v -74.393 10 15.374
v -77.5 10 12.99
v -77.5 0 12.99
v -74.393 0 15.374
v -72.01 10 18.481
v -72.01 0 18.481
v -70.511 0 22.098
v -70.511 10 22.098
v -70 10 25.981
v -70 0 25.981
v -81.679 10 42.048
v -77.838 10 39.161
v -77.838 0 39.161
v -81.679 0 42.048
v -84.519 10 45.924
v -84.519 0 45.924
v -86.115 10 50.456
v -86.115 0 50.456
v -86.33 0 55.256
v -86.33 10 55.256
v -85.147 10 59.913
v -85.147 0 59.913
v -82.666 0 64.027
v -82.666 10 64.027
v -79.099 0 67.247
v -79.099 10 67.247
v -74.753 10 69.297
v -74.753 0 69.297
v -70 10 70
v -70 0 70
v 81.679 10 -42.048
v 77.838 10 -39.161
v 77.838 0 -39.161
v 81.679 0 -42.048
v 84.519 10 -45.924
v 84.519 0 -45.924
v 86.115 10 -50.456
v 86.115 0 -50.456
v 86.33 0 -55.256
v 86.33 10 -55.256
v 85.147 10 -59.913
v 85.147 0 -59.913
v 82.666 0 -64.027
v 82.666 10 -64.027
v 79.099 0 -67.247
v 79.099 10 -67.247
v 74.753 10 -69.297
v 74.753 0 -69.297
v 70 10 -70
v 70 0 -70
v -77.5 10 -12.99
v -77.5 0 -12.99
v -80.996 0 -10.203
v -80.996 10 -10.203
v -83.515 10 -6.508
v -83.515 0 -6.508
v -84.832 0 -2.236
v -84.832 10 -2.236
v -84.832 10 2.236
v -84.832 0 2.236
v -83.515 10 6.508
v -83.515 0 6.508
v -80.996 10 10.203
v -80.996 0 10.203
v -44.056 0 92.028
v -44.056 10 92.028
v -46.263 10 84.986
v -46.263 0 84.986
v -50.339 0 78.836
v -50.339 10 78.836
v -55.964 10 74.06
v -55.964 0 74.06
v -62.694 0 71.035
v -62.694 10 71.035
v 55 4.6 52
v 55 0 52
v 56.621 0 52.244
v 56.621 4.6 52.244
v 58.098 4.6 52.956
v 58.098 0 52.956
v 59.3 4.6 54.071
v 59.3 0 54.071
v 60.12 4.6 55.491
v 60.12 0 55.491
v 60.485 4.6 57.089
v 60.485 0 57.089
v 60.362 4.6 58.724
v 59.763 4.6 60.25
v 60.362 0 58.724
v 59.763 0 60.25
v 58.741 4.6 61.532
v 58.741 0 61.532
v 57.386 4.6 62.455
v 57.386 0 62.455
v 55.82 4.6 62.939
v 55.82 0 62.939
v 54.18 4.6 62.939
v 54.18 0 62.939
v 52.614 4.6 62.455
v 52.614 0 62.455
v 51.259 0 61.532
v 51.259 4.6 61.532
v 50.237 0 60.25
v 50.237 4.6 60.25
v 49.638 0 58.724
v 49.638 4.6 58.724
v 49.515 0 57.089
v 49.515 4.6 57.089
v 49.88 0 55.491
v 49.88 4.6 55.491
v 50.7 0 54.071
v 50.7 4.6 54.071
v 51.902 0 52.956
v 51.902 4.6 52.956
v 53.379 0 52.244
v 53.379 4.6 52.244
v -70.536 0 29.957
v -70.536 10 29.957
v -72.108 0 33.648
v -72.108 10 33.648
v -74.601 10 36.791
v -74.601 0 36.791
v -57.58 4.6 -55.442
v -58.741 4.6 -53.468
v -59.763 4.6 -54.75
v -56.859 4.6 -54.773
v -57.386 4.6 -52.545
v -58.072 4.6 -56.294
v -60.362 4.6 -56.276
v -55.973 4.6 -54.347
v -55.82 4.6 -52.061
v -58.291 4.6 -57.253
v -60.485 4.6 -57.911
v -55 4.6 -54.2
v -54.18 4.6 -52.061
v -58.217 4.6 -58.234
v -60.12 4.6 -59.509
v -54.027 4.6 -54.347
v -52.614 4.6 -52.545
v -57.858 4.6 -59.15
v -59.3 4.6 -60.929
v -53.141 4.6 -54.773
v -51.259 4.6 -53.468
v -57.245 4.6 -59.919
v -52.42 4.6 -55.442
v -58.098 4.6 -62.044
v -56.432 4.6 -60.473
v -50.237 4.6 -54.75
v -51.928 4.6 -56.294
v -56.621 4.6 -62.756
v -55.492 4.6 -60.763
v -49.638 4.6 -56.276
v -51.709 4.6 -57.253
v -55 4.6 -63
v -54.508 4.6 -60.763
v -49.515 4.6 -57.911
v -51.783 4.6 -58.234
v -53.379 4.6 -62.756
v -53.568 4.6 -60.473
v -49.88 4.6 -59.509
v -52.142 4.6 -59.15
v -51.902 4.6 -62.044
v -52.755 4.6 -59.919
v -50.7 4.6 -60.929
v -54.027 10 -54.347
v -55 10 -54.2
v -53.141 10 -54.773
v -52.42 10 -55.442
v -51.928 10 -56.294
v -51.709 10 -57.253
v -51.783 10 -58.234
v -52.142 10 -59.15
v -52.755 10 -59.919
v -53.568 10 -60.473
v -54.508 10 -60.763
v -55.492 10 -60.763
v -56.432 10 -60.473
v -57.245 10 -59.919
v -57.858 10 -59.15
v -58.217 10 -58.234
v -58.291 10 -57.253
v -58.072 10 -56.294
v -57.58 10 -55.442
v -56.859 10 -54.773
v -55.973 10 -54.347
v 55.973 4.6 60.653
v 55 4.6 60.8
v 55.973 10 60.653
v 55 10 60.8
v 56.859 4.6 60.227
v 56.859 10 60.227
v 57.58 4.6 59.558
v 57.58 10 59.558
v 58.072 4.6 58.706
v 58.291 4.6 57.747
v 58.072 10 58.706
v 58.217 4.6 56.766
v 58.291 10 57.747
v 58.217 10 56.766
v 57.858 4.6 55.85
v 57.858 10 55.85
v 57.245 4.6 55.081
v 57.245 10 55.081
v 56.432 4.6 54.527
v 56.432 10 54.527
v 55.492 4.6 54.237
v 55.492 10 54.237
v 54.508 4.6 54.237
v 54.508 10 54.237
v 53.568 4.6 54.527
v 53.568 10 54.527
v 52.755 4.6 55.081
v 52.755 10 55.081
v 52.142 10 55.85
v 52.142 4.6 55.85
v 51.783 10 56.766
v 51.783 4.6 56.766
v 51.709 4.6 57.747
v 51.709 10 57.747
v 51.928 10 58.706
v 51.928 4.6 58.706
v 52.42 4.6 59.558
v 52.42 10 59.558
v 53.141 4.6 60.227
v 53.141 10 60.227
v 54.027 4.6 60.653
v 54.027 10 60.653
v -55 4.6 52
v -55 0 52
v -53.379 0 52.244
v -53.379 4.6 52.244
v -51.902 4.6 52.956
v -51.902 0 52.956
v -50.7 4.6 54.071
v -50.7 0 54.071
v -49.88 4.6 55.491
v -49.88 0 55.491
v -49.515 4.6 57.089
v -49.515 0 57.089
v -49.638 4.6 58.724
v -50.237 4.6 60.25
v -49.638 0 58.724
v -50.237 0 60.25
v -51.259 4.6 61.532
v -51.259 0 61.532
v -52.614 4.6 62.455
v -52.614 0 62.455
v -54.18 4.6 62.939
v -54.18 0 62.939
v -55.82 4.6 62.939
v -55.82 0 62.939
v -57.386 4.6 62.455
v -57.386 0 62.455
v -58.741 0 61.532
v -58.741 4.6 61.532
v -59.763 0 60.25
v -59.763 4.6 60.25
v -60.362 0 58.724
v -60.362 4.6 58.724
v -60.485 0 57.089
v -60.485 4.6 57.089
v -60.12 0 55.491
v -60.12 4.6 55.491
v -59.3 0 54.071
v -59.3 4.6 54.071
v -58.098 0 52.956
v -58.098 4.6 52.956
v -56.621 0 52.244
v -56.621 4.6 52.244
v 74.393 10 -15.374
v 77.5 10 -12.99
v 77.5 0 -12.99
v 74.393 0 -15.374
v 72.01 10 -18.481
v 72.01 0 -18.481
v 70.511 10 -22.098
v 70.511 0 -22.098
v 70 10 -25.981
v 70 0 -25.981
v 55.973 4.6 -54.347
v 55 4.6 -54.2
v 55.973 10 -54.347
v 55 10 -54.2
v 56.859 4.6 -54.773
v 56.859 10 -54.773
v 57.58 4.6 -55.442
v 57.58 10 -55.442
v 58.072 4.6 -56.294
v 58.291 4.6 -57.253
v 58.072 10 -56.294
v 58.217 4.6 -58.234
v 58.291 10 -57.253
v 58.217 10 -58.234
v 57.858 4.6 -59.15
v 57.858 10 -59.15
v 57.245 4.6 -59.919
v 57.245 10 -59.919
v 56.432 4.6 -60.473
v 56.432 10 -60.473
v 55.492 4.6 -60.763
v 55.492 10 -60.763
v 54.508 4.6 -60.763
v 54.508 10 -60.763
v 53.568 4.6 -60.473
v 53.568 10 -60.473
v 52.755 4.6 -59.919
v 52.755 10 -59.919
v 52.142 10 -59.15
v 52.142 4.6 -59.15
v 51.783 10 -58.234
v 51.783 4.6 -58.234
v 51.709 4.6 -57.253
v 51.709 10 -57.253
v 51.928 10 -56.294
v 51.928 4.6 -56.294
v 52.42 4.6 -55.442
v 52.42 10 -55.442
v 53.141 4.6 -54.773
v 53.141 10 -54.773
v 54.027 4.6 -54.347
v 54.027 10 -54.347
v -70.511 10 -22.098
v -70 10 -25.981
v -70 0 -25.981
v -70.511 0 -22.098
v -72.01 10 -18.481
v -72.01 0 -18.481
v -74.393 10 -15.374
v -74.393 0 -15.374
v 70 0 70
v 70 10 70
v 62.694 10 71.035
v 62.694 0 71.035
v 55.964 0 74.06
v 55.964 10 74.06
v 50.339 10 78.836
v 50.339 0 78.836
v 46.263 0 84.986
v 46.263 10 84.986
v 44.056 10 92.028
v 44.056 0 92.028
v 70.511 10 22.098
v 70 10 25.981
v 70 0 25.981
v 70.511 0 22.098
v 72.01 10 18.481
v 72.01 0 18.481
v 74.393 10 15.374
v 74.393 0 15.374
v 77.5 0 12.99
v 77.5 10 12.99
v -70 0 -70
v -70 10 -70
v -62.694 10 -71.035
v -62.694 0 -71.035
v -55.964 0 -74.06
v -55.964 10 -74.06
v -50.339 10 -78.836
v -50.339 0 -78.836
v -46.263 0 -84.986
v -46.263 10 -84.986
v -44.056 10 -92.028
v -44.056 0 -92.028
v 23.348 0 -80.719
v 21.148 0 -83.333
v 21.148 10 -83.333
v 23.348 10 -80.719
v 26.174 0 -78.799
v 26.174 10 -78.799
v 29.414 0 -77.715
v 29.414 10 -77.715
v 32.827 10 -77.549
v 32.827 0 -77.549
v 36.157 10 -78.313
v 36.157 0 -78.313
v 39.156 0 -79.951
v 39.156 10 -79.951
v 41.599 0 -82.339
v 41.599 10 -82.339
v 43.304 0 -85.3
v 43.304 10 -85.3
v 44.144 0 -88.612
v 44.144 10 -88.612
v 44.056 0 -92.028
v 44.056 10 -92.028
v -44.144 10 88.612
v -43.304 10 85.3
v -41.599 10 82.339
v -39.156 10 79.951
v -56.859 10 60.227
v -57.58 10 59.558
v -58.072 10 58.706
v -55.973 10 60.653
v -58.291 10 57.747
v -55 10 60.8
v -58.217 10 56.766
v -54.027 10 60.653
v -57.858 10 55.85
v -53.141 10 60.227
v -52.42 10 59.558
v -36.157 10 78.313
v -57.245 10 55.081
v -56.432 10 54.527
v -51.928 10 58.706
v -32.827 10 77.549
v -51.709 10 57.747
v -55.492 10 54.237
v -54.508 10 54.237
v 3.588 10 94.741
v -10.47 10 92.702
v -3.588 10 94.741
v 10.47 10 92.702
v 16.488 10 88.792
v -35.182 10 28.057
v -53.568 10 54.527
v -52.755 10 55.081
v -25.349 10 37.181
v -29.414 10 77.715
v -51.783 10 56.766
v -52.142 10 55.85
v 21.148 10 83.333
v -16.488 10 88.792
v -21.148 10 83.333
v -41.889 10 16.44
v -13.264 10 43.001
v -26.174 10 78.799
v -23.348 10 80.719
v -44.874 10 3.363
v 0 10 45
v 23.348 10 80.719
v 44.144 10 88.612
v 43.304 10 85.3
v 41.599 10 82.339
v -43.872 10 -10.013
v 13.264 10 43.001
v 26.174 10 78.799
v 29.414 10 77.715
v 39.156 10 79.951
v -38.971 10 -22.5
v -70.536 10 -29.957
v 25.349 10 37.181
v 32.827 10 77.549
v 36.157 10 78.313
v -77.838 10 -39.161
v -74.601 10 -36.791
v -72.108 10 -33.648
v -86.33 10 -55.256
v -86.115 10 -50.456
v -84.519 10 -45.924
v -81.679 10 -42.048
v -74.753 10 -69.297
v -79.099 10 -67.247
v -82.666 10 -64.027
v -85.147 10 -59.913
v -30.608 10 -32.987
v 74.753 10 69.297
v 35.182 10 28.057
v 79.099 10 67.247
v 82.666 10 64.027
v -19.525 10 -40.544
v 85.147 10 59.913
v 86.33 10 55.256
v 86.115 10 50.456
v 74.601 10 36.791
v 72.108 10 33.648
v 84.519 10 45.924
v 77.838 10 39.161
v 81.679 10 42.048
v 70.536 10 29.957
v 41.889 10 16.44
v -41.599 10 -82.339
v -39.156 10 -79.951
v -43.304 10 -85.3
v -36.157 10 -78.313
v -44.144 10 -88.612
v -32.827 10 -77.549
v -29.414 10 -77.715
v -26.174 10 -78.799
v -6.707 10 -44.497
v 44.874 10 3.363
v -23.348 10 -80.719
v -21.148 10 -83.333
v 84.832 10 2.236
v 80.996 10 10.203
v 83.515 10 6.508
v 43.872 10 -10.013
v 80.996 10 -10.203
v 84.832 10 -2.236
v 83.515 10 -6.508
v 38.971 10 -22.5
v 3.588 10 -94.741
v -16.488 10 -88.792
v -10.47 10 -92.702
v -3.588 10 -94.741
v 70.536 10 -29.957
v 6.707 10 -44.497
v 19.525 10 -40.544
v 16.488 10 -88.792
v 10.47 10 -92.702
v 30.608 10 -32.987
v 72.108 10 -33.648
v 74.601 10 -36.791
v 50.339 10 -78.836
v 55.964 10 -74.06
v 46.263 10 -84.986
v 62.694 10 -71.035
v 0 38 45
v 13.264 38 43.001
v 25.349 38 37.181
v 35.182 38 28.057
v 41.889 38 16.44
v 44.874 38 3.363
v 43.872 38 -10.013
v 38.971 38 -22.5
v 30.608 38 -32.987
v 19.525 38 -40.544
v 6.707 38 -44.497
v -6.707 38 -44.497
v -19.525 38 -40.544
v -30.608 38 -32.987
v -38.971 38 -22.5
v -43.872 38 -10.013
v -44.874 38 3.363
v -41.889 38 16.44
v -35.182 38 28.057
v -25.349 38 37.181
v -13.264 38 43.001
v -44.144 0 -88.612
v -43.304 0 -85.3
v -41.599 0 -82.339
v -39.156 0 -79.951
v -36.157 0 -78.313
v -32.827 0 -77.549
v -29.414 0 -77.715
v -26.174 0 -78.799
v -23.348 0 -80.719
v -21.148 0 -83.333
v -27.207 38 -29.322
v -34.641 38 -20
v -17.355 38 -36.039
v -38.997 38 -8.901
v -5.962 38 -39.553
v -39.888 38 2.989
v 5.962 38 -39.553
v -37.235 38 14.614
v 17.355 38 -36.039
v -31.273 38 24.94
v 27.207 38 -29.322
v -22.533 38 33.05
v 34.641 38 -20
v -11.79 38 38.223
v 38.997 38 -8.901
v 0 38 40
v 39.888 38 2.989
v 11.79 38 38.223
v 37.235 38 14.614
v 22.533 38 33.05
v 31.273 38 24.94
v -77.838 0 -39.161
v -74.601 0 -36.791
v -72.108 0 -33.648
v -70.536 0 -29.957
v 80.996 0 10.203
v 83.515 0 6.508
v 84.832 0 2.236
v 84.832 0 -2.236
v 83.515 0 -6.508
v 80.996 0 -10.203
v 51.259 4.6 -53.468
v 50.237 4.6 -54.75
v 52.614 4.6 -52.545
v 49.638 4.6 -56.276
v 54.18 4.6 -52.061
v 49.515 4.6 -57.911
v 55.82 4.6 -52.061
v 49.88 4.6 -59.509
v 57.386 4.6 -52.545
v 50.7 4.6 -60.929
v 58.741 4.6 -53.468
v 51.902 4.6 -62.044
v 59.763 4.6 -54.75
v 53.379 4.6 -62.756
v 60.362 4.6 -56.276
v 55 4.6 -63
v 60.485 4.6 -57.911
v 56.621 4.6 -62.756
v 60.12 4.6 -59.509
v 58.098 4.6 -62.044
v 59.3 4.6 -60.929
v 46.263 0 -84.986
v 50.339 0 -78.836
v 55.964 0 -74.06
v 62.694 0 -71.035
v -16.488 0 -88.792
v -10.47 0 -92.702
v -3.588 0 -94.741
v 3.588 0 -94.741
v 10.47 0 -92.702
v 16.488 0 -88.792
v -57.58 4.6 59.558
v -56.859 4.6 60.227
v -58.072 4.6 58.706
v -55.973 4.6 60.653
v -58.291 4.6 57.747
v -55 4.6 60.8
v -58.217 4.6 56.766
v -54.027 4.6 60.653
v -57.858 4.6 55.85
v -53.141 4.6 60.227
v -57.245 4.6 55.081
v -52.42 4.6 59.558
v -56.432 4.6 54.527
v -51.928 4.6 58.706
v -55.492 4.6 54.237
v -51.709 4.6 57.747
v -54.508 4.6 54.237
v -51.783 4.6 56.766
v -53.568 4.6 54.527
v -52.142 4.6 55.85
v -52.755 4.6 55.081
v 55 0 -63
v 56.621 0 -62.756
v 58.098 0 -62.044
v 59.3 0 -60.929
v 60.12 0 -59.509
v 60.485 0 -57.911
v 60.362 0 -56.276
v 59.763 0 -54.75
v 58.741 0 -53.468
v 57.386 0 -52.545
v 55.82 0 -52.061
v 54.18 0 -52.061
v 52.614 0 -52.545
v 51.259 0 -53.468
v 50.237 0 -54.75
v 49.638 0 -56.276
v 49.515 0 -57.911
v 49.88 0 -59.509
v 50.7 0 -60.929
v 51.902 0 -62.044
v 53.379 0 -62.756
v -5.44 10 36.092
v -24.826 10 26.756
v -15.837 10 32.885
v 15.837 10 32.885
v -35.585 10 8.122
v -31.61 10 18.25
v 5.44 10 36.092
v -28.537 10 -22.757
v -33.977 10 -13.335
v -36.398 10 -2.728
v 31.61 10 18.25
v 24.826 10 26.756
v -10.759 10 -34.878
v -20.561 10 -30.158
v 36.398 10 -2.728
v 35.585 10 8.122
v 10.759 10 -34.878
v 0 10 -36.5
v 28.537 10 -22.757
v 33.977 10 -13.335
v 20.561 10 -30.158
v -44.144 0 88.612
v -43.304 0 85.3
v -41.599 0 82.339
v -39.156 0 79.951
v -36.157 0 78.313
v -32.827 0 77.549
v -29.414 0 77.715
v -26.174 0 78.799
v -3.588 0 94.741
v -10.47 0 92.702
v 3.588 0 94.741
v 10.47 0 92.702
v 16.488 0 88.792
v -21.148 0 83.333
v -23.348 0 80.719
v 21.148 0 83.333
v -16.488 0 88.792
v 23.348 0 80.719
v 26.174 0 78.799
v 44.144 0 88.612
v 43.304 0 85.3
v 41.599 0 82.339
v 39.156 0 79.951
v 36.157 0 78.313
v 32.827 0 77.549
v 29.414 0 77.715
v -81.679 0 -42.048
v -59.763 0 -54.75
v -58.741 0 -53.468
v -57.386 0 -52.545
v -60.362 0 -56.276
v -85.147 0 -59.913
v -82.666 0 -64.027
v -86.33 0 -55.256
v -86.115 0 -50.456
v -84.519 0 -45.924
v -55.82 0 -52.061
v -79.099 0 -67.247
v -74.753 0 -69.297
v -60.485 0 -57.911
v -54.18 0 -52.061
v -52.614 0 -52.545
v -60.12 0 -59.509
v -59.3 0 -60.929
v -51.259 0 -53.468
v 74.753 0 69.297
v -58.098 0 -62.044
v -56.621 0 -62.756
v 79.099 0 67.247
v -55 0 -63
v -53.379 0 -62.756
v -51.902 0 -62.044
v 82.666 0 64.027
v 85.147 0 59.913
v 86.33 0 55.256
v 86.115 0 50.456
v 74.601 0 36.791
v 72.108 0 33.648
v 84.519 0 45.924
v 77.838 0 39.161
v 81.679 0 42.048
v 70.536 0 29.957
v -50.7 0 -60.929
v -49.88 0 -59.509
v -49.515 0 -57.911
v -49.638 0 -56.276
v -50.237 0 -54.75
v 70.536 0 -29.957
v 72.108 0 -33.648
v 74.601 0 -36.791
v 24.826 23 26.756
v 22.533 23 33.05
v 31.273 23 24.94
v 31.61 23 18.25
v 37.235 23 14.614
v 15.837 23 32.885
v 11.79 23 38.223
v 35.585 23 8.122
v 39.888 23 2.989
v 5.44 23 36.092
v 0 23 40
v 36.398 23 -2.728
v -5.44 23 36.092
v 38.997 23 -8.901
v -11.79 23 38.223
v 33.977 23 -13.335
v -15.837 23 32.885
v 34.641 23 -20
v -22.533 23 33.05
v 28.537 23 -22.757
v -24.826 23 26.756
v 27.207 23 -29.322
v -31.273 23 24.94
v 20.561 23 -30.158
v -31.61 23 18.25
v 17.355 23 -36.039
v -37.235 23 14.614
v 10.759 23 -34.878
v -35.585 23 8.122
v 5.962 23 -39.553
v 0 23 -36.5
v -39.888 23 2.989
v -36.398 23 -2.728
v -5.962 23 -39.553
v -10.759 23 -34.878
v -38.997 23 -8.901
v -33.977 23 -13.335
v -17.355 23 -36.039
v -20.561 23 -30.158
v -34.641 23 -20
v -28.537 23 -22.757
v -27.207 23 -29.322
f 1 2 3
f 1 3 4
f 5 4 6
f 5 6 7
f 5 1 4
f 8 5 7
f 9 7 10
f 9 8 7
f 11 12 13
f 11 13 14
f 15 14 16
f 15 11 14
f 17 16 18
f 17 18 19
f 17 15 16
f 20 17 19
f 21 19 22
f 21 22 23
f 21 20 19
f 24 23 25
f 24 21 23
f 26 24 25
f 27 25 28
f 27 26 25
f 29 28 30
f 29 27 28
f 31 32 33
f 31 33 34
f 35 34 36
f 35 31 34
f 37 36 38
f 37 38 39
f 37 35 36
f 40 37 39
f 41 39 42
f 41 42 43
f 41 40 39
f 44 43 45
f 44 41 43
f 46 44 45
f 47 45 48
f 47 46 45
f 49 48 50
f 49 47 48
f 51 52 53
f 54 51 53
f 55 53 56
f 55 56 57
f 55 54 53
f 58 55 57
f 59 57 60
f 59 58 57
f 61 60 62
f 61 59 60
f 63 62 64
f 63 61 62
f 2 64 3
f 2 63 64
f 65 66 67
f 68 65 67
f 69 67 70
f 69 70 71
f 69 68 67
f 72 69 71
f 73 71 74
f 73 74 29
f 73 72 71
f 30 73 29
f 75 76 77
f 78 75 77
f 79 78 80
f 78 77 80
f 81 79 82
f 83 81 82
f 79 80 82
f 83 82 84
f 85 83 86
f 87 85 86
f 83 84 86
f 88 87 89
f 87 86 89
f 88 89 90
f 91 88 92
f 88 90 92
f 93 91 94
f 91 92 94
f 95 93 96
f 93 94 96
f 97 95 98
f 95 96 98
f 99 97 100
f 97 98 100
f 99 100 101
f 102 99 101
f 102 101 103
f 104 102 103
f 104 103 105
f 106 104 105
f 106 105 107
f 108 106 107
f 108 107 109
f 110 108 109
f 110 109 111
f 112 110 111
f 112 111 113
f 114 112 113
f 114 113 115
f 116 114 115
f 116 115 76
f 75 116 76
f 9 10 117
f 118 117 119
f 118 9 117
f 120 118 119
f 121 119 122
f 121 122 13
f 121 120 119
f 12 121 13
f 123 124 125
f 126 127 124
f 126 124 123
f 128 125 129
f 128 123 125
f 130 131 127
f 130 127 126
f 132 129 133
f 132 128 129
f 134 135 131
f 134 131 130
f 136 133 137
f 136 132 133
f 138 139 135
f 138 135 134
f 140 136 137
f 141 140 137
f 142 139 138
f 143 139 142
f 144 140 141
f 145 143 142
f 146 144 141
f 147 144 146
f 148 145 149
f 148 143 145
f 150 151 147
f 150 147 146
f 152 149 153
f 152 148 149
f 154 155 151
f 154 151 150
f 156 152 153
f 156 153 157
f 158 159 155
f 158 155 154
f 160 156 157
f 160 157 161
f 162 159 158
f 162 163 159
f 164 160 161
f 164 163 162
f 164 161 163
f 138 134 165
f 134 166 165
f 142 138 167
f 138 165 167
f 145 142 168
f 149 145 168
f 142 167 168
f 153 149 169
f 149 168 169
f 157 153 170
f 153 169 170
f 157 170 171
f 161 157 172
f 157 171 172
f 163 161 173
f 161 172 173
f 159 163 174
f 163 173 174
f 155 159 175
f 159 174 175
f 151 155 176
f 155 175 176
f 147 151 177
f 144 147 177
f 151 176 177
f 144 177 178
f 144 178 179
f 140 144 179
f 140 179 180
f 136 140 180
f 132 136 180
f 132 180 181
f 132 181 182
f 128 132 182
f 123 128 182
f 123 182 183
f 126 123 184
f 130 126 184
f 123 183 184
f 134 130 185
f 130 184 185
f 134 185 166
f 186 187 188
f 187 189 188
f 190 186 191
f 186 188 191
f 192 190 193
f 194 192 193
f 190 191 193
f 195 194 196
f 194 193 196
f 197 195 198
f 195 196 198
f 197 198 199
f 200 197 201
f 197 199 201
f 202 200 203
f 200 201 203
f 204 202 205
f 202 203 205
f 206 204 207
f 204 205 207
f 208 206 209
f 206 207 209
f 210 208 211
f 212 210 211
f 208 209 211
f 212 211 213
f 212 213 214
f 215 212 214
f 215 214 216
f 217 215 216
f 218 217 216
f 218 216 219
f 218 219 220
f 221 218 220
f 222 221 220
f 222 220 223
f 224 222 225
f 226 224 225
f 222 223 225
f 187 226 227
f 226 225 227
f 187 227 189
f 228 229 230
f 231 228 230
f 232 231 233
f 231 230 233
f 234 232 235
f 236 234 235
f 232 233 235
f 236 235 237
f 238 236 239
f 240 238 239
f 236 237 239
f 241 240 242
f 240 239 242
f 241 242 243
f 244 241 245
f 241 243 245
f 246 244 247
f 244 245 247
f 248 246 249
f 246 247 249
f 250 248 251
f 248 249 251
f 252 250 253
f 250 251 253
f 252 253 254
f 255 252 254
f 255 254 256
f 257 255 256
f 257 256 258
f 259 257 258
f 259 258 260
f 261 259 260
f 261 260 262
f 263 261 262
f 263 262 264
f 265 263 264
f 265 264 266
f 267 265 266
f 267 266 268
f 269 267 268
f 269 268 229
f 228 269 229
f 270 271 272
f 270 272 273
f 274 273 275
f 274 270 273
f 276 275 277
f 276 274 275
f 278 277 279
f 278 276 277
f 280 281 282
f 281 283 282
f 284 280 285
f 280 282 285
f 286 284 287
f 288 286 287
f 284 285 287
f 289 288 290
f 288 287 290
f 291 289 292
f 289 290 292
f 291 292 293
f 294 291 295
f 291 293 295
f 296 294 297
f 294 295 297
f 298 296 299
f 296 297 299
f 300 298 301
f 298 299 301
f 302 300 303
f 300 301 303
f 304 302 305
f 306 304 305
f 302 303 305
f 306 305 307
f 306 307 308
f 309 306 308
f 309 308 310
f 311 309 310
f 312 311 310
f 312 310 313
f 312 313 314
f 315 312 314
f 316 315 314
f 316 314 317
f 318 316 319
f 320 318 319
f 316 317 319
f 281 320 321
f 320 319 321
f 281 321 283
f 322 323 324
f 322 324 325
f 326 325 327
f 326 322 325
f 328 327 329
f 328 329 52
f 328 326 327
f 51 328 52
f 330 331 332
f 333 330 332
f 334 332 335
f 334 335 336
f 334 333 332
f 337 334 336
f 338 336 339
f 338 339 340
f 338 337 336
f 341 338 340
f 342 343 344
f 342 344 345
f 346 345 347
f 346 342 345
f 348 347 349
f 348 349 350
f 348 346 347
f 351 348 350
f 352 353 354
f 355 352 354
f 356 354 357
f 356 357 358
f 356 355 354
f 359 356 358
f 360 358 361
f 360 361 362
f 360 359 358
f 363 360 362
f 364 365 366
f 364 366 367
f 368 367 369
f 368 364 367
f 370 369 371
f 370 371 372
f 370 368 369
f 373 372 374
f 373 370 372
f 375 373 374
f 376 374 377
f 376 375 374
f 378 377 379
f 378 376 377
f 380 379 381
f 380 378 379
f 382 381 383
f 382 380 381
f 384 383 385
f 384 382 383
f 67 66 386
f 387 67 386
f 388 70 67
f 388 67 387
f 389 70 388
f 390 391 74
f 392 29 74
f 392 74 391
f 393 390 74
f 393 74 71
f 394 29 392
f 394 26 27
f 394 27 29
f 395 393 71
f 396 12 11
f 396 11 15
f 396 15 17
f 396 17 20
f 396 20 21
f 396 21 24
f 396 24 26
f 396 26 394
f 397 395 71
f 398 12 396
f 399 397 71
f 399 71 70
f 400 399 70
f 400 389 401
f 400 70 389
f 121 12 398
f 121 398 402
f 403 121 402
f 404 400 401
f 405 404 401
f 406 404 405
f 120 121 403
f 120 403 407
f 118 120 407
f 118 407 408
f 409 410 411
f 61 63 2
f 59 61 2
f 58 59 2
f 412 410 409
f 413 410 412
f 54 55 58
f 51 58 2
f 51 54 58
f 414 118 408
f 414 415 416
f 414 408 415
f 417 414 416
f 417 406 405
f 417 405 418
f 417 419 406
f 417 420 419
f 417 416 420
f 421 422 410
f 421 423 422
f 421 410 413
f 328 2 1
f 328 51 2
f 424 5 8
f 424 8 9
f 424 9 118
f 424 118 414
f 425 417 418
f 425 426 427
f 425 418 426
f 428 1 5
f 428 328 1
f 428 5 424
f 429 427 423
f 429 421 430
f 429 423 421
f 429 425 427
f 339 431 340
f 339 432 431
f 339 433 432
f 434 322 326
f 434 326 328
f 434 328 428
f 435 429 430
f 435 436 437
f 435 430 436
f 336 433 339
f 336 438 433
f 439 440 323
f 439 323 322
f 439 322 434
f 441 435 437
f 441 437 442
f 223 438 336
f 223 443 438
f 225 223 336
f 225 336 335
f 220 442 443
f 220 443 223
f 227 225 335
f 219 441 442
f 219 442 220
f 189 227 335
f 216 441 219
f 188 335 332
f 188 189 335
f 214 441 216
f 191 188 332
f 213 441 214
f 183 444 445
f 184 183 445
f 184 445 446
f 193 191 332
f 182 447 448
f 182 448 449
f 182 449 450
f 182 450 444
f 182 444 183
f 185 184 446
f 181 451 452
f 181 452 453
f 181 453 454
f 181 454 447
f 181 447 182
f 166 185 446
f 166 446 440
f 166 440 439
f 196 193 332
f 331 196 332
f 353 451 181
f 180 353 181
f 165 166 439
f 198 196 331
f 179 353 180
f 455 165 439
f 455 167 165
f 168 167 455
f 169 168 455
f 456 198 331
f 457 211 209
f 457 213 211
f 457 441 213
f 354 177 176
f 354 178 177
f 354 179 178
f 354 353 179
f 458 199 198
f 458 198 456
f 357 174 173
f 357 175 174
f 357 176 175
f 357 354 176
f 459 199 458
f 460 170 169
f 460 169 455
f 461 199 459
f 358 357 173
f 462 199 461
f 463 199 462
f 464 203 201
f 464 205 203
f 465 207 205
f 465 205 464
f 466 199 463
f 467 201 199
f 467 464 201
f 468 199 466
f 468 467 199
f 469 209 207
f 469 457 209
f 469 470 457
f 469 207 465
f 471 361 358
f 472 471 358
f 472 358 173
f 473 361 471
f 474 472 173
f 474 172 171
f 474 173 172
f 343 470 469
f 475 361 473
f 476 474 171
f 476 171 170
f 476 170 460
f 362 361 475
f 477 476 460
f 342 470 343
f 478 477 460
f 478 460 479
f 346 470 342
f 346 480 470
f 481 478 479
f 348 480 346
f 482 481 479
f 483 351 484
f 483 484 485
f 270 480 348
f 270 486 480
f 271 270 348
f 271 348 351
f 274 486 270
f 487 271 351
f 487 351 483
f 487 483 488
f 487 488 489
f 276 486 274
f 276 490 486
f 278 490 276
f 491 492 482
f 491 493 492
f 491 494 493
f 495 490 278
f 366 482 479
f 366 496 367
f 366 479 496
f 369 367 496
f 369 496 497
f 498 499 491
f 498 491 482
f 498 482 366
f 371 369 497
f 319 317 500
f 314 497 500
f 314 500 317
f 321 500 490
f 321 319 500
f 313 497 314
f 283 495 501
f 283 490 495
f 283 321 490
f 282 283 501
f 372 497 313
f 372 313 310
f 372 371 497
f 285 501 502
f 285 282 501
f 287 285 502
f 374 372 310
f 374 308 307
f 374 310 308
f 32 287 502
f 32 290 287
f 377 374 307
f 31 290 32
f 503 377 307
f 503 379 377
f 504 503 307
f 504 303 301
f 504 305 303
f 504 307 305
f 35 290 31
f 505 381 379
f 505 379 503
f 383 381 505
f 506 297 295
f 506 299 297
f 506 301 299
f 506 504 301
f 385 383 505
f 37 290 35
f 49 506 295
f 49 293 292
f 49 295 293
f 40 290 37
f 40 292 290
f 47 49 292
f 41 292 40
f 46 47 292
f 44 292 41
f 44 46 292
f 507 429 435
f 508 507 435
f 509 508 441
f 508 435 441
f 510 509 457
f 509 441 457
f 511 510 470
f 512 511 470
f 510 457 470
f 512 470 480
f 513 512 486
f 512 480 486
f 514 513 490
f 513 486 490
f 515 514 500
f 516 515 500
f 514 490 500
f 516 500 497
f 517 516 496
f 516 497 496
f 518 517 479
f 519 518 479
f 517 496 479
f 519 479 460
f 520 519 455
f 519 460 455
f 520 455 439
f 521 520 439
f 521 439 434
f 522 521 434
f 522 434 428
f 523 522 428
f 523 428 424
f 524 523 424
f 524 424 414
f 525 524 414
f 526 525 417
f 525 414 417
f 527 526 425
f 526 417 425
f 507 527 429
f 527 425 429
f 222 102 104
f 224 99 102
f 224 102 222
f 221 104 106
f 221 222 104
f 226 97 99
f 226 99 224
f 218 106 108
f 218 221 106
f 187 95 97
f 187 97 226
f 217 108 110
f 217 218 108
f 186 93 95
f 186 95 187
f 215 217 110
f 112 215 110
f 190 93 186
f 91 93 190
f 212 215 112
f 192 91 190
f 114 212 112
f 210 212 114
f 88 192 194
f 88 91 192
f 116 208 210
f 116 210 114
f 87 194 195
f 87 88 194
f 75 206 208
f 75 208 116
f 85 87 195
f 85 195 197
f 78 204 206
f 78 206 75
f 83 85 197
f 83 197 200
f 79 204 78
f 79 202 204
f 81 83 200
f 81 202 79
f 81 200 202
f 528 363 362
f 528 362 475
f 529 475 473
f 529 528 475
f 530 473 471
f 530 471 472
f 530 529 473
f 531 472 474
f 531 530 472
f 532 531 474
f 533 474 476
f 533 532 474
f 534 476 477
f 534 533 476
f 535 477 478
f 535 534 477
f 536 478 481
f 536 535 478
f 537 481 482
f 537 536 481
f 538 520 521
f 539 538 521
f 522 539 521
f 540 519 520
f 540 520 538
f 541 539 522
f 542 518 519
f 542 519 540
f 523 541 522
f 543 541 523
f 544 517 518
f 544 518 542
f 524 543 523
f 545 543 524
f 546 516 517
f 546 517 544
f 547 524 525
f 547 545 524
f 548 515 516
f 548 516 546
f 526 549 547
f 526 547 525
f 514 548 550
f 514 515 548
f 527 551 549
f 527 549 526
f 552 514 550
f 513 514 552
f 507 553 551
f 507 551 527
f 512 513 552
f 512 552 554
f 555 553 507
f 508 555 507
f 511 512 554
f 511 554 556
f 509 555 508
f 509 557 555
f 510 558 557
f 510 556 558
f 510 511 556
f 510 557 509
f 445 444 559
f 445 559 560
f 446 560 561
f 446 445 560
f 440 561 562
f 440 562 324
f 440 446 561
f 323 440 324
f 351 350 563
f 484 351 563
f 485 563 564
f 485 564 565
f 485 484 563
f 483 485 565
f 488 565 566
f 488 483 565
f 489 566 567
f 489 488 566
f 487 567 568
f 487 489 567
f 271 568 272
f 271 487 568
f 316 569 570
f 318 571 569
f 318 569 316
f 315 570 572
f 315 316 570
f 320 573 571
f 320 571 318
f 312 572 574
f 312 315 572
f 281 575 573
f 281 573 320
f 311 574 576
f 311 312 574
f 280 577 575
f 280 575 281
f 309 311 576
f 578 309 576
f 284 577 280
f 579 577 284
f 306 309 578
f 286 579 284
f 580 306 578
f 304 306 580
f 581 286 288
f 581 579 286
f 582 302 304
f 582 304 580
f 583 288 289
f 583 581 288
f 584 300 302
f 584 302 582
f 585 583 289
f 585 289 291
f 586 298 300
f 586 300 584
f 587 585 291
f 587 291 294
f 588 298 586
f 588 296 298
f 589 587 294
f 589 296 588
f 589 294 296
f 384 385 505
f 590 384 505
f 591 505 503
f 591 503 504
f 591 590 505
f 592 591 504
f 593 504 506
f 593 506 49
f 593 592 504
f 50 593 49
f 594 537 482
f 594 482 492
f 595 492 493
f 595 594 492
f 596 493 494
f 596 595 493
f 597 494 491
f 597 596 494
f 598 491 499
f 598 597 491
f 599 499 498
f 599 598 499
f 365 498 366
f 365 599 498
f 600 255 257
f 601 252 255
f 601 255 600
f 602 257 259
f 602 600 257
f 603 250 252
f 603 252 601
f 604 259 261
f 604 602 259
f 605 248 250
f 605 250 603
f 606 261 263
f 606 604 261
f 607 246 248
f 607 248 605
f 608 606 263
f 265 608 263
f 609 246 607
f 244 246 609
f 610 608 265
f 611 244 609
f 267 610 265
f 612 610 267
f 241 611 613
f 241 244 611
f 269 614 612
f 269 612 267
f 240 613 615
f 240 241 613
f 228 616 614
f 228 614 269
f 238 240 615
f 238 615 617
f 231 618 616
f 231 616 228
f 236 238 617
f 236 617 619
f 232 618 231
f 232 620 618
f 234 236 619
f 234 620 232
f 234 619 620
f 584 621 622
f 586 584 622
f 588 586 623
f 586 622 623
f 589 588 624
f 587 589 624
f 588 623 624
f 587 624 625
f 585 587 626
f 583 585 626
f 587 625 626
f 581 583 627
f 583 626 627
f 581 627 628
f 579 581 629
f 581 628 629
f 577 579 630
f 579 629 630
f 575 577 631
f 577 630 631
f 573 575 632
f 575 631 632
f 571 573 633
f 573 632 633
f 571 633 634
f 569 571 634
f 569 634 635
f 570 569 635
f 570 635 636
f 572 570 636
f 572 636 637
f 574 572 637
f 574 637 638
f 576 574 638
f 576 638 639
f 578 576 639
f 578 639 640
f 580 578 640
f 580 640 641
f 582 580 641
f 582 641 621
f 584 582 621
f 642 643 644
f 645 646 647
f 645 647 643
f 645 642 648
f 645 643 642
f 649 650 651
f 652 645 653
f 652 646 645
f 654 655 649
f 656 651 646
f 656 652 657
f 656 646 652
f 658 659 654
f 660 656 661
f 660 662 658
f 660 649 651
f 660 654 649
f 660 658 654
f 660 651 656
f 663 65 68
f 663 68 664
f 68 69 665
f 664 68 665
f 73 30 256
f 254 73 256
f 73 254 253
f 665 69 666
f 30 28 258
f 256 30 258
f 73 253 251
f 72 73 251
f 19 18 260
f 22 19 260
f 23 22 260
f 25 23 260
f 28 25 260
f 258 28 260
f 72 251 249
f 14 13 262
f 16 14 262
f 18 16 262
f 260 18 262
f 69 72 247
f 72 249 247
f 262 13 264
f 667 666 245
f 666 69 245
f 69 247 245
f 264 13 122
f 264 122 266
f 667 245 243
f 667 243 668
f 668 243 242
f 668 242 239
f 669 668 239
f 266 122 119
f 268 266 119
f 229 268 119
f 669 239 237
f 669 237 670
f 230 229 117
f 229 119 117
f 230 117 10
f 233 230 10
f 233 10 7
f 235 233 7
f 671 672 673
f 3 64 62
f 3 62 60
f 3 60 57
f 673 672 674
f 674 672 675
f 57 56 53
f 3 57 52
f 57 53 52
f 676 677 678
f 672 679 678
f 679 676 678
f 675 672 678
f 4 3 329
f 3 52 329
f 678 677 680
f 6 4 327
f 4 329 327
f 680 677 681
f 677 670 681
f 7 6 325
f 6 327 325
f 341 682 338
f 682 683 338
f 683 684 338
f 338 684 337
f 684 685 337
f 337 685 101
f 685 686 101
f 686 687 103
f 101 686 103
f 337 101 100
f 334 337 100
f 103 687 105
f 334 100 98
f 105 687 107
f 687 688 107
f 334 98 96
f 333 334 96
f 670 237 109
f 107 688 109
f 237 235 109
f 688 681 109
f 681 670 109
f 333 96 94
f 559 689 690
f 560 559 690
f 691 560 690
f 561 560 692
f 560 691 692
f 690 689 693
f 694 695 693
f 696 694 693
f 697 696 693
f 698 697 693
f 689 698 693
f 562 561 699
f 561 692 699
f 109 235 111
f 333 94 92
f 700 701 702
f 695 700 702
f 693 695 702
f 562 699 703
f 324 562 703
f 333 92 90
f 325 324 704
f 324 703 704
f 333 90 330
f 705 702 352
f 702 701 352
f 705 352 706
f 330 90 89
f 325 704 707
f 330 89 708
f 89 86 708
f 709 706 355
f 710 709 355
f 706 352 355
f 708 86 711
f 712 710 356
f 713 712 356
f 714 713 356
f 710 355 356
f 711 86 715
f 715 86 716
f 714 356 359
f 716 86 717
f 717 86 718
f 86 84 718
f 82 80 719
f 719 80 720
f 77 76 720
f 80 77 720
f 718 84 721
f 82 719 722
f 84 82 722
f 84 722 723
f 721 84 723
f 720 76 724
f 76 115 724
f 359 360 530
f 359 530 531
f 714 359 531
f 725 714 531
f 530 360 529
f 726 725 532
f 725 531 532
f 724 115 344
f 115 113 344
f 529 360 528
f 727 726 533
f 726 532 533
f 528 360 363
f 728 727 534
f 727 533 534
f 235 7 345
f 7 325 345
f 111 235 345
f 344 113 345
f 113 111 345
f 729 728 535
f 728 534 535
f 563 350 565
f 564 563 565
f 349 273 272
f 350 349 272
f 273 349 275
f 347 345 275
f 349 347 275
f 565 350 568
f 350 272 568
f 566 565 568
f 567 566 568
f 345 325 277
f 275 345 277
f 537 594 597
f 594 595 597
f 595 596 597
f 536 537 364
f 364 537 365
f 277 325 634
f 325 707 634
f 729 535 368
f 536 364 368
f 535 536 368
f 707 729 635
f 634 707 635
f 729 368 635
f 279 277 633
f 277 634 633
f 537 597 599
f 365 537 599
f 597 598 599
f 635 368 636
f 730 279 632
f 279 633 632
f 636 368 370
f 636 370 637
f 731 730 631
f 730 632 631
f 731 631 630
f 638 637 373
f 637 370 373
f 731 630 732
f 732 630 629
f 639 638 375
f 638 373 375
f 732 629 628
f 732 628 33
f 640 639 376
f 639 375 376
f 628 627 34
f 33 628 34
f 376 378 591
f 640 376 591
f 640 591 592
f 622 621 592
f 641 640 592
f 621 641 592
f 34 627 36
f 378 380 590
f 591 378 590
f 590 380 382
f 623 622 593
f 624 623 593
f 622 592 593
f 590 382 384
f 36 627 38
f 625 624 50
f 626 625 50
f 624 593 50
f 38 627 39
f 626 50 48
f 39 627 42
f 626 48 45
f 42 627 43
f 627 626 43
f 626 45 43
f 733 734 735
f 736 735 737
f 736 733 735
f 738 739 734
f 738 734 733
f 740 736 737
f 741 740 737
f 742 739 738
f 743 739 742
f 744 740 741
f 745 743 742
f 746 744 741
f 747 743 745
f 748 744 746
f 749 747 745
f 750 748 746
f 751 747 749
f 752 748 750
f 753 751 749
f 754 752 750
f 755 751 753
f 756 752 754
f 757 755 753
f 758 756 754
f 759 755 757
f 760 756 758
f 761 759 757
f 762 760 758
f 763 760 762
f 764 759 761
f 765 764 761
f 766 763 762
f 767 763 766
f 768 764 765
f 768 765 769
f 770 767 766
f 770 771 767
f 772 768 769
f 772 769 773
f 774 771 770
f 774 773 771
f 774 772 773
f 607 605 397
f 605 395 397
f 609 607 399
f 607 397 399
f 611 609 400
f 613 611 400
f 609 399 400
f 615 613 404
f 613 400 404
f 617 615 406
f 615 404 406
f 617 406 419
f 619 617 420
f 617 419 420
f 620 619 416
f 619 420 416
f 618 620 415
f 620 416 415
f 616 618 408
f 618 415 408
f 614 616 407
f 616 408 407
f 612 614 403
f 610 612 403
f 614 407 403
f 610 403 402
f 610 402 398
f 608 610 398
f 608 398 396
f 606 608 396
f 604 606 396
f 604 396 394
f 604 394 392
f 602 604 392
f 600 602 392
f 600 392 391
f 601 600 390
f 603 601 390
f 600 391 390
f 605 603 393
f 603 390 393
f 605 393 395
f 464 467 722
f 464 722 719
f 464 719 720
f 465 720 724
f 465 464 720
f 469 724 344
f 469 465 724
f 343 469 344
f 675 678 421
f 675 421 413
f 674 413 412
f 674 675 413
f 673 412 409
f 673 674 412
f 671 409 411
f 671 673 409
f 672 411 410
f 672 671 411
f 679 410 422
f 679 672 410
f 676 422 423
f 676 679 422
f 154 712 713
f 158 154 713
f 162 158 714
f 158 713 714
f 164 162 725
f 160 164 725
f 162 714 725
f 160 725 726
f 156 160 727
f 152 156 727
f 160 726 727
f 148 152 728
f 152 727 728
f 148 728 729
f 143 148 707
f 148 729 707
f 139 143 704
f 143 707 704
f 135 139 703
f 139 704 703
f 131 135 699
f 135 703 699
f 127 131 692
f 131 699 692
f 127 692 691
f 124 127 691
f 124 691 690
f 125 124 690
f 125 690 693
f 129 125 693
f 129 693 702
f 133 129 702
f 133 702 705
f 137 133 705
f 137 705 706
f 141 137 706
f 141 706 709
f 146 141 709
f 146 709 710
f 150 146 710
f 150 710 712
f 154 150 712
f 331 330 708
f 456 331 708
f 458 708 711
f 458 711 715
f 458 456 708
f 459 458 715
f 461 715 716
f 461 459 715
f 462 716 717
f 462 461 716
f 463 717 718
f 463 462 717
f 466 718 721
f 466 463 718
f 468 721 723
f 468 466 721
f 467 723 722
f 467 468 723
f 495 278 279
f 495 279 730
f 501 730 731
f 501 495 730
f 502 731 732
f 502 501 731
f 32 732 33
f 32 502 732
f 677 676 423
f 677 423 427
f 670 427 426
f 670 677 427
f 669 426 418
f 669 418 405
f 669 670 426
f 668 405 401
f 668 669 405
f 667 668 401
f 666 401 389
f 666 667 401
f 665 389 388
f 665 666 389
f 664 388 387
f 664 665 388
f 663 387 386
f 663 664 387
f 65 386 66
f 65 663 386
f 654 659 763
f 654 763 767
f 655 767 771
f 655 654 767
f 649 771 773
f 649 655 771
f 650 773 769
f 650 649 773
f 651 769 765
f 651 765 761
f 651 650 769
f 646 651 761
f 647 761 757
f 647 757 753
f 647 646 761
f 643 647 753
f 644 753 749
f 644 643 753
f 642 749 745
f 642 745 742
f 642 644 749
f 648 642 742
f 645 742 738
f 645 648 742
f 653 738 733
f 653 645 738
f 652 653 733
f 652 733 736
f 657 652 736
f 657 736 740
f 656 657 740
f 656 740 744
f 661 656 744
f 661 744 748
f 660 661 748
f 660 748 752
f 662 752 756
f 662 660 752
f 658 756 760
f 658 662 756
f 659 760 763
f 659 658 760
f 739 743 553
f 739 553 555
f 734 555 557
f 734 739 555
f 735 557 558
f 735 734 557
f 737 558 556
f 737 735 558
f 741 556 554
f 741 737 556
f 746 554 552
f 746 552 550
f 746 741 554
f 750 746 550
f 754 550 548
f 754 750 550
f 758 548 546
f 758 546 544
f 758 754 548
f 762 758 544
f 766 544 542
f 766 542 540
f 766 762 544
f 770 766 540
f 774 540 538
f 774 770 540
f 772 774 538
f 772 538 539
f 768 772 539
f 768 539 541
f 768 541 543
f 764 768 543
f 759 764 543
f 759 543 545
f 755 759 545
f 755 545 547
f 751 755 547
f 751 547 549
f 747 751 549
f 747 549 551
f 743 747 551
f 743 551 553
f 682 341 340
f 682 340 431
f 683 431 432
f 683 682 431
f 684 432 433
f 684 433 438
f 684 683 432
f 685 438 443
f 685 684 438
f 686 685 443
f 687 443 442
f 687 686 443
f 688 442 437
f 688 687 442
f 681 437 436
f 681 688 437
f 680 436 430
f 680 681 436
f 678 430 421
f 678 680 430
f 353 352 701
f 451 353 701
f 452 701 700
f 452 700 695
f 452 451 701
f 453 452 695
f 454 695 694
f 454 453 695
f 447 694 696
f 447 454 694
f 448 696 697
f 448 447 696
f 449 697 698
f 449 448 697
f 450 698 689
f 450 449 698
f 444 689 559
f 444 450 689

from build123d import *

# Parameters (mm, degrees)
SALIENTE_EXTRUIR1_DEPTH                              = 10
SALIENTE_EXTRUIR2_DEPTH                              = 10
CROQUIS3_R                                           = 40
CROQUIS3_R_2                                         = 36.5
SALIENTE_EXTRUIR3_DEPTH                              = 13
CROQUIS4_R                                           = 45
CROQUIS4_R_2                                         = 40
SALIENTE_EXTRUIR4_DEPTH                              = 28
REFRENTADO_PARA_TORNILLO_CON_CABEZA_HUEC_D           = 6.6
REFRENTADO_PARA_TORNILLO_CON_CABEZA_HUEC_CBORE_D     = 11
REFRENTADO_PARA_TORNILLO_CON_CABEZA_HUEC_CBORE_DEPTH = 4.6


with BuildPart() as part:
    # Croquis1 → Saliente-Extruir1 (new body)
    with BuildSketch(Plane(origin=(0, 0, 0), x_dir=(1, 0, 0), z_dir=(0, 1, 0))):
        with BuildLine():
            Line((-70, -70), (-70, 70))
            ThreePointArc((-70, 70), (-52.983030462, 76.249658661), (-44.055908755, 92.027554074))
            ThreePointArc((-44.055908755, 92.027554074), (-36.156795126, 78.313355526), (-21.147629234, 83.333333333))
            ThreePointArc((-21.147629234, 83.333333333), (0, 95), (21.147629234, 83.333333333))
            ThreePointArc((21.147629234, 83.333333333), (36.156795126, 78.313355526), (44.055908755, 92.027554074))
            ThreePointArc((44.055908755, 92.027554074), (52.983030462, 76.249658661), (70, 70))
            Line((70, 70), (70, -70))
            ThreePointArc((70, -70), (52.983030462, -76.249658661), (44.055908755, -92.027554074))
            ThreePointArc((44.055908755, -92.027554074), (36.156795126, -78.313355526), (21.147629234, -83.333333333))
            ThreePointArc((21.147629234, -83.333333333), (0, -95), (-21.147629234, -83.333333333))
            ThreePointArc((-21.147629234, -83.333333333), (-36.156795126, -78.313355526), (-44.055908755, -92.027554074))
            ThreePointArc((-44.055908755, -92.027554074), (-52.983030462, -76.249658661), (-70, -70))
        make_face()
    extrude(amount=SALIENTE_EXTRUIR1_DEPTH)

    # Croquis2 → Saliente-Extruir2 (add)
    with BuildSketch(Plane(origin=(0, 10, 0), x_dir=(1, 0, 0), z_dir=(0, 1, 0))):
        with BuildLine():
            Line((-70, 25.98076189), (-70, 70))
            ThreePointArc((-70, 70), (-85.909969357, 57.627811916), (-77.837993487, 39.160506523))
            ThreePointArc((-77.837993487, 39.160506523), (-72.107558403, 33.647896498), (-70, 25.98076189))
        make_face()
        with BuildLine():
            ThreePointArc((77.837993487, 39.160506523), (85.909969357, 57.627811916), (70, 70))
            Line((70, 70), (70, 25.98076213))
            ThreePointArc((70, 25.98076213), (72.107558465, 33.647896602), (77.837993487, 39.160506523))
        make_face()
        with BuildLine():
            ThreePointArc((77.5, 12.990381057), (72.009618939, 18.480762121), (70, 25.98076213))
            Line((70, 25.98076213), (70, -25.98076213))
            ThreePointArc((70, -25.98076213), (72.009618939, -18.480762121), (77.5, -12.990381057))
            ThreePointArc((77.5, -12.990381057), (85, 0), (77.5, 12.990381057))
        make_face()
        with BuildLine():
            Line((-70, -25.980762199), (-70, 25.98076189))
            ThreePointArc((-70, 25.98076189), (-72.009618999, 18.480762017), (-77.5, 12.990381057))
            ThreePointArc((-77.5, 12.990381057), (-85, 0), (-77.5, -12.990381057))
            ThreePointArc((-77.5, -12.990381057), (-72.009618922, -18.480762151), (-70, -25.980762199))
        make_face()
        with BuildLine():
            Line((-70, -70), (-70, -25.980762199))
            ThreePointArc((-70, -25.980762199), (-72.107558482, -33.647896631), (-77.837993487, -39.160506523))
            ThreePointArc((-77.837993487, -39.160506523), (-85.909969357, -57.627811916), (-70, -70))
        make_face()
        with BuildLine():
            ThreePointArc((77.837993487, -39.160506523), (72.107558465, -33.647896602), (70, -25.98076213))
            Line((70, -25.98076213), (70, -70))
            ThreePointArc((70, -70), (85.909969357, -57.627811916), (77.837993487, -39.160506523))
        make_face()
    extrude(amount=-SALIENTE_EXTRUIR2_DEPTH)

    # Croquis3 → Saliente-Extruir3 (add)
    with BuildSketch(Plane(origin=(0, 10, 0), x_dir=(1, 0, 0), z_dir=(0, 1, 0))):
        with Locations(Location((0, 0, 0), (0, 0, 90))):
            Circle(CROQUIS3_R)
        with Locations(Location((0, 0, 0), (0, 0, 90))):
            Circle(CROQUIS3_R_2, mode=Mode.SUBTRACT)
    extrude(amount=SALIENTE_EXTRUIR3_DEPTH)

    # Croquis4 → Saliente-Extruir4 (add)
    with BuildSketch(Plane(origin=(0, 10, 0), x_dir=(1, 0, 0), z_dir=(0, 1, 0))):
        with Locations(Location((0, 0, 0), (0, 0, 270))):
            Circle(CROQUIS4_R)
        with Locations(Location((0, 0, 0), (0, 0, 270))):
            Circle(CROQUIS4_R_2, mode=Mode.SUBTRACT)
    extrude(amount=SALIENTE_EXTRUIR4_DEPTH)

    # Refrentado para tornillo con cabeza hueca hexagonal de M61 (through all)
    with Locations(Plane(origin=(-55, 0, 57.5), x_dir=(0, 0, -1), z_dir=(0, -1, 0))):
        with Locations((0, 0), (0, 110), (115, 110), (115, 0)):
            CounterBoreHole(REFRENTADO_PARA_TORNILLO_CON_CABEZA_HUEC_D / 2, REFRENTADO_PARA_TORNILLO_CON_CABEZA_HUEC_CBORE_D / 2, REFRENTADO_PARA_TORNILLO_CON_CABEZA_HUEC_CBORE_DEPTH)


solid = part.part
